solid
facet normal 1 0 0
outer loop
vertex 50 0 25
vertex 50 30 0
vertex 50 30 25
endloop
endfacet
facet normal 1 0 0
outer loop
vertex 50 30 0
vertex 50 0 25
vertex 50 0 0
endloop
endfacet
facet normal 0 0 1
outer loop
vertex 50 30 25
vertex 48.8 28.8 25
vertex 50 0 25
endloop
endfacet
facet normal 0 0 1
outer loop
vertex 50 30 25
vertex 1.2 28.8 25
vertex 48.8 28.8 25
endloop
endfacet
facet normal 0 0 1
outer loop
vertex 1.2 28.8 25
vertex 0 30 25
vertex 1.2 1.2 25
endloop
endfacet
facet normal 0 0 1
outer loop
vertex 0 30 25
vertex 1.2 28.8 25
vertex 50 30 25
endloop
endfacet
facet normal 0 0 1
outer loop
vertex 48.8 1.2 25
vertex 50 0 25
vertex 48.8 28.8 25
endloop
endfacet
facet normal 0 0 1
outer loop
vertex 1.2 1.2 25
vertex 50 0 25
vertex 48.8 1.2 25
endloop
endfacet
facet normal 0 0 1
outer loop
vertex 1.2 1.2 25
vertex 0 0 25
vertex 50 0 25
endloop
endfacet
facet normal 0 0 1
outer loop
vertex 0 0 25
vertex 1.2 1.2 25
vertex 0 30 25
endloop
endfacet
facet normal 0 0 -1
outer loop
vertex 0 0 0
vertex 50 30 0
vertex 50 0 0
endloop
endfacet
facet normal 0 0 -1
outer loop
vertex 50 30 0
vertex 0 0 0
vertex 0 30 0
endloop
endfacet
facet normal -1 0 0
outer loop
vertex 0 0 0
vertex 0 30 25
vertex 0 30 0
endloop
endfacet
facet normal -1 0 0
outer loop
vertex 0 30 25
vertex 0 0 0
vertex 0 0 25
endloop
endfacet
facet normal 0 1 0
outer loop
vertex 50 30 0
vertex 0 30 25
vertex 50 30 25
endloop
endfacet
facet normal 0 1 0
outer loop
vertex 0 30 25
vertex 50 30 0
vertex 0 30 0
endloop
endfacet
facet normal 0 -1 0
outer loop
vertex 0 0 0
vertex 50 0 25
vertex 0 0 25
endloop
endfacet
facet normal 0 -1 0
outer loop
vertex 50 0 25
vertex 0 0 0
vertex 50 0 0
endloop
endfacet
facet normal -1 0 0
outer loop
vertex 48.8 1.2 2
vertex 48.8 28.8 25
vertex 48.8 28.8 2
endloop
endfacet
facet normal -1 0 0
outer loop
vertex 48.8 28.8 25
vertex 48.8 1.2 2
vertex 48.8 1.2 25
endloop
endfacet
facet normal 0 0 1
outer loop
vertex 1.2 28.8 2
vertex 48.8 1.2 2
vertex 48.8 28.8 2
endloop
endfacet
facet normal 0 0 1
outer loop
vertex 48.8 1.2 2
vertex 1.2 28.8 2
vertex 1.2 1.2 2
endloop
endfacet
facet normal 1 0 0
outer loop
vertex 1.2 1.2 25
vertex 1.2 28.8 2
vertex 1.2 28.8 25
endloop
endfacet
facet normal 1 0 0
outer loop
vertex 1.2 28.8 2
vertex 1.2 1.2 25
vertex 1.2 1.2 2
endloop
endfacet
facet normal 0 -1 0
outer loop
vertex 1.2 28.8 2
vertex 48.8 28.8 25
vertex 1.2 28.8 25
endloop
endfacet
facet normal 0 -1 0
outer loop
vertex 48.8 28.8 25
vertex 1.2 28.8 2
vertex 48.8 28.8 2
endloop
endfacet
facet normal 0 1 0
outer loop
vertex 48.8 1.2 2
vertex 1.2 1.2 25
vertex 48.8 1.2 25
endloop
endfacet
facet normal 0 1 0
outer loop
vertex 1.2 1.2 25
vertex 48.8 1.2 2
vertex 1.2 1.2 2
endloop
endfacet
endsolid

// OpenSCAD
$fn = 32;

// ----------------------------------------------------------------------
// Open box: 1.2 mm walls
// ----------------------------------------------------------------------

// --- parameters (mm) ---
box_l = 50;               // outer length, X
box_w = 30;               // outer width, Y
box_h = 25;               // outer height, Z
wall = 1.2;               // wall thickness
floor = 2;                // floor thickness

difference() {
  cube([box_l, box_w, box_h]);
  translate([wall, wall, floor])
    cube([box_l - 2 * wall, box_w - 2 * wall, box_h]);
}
